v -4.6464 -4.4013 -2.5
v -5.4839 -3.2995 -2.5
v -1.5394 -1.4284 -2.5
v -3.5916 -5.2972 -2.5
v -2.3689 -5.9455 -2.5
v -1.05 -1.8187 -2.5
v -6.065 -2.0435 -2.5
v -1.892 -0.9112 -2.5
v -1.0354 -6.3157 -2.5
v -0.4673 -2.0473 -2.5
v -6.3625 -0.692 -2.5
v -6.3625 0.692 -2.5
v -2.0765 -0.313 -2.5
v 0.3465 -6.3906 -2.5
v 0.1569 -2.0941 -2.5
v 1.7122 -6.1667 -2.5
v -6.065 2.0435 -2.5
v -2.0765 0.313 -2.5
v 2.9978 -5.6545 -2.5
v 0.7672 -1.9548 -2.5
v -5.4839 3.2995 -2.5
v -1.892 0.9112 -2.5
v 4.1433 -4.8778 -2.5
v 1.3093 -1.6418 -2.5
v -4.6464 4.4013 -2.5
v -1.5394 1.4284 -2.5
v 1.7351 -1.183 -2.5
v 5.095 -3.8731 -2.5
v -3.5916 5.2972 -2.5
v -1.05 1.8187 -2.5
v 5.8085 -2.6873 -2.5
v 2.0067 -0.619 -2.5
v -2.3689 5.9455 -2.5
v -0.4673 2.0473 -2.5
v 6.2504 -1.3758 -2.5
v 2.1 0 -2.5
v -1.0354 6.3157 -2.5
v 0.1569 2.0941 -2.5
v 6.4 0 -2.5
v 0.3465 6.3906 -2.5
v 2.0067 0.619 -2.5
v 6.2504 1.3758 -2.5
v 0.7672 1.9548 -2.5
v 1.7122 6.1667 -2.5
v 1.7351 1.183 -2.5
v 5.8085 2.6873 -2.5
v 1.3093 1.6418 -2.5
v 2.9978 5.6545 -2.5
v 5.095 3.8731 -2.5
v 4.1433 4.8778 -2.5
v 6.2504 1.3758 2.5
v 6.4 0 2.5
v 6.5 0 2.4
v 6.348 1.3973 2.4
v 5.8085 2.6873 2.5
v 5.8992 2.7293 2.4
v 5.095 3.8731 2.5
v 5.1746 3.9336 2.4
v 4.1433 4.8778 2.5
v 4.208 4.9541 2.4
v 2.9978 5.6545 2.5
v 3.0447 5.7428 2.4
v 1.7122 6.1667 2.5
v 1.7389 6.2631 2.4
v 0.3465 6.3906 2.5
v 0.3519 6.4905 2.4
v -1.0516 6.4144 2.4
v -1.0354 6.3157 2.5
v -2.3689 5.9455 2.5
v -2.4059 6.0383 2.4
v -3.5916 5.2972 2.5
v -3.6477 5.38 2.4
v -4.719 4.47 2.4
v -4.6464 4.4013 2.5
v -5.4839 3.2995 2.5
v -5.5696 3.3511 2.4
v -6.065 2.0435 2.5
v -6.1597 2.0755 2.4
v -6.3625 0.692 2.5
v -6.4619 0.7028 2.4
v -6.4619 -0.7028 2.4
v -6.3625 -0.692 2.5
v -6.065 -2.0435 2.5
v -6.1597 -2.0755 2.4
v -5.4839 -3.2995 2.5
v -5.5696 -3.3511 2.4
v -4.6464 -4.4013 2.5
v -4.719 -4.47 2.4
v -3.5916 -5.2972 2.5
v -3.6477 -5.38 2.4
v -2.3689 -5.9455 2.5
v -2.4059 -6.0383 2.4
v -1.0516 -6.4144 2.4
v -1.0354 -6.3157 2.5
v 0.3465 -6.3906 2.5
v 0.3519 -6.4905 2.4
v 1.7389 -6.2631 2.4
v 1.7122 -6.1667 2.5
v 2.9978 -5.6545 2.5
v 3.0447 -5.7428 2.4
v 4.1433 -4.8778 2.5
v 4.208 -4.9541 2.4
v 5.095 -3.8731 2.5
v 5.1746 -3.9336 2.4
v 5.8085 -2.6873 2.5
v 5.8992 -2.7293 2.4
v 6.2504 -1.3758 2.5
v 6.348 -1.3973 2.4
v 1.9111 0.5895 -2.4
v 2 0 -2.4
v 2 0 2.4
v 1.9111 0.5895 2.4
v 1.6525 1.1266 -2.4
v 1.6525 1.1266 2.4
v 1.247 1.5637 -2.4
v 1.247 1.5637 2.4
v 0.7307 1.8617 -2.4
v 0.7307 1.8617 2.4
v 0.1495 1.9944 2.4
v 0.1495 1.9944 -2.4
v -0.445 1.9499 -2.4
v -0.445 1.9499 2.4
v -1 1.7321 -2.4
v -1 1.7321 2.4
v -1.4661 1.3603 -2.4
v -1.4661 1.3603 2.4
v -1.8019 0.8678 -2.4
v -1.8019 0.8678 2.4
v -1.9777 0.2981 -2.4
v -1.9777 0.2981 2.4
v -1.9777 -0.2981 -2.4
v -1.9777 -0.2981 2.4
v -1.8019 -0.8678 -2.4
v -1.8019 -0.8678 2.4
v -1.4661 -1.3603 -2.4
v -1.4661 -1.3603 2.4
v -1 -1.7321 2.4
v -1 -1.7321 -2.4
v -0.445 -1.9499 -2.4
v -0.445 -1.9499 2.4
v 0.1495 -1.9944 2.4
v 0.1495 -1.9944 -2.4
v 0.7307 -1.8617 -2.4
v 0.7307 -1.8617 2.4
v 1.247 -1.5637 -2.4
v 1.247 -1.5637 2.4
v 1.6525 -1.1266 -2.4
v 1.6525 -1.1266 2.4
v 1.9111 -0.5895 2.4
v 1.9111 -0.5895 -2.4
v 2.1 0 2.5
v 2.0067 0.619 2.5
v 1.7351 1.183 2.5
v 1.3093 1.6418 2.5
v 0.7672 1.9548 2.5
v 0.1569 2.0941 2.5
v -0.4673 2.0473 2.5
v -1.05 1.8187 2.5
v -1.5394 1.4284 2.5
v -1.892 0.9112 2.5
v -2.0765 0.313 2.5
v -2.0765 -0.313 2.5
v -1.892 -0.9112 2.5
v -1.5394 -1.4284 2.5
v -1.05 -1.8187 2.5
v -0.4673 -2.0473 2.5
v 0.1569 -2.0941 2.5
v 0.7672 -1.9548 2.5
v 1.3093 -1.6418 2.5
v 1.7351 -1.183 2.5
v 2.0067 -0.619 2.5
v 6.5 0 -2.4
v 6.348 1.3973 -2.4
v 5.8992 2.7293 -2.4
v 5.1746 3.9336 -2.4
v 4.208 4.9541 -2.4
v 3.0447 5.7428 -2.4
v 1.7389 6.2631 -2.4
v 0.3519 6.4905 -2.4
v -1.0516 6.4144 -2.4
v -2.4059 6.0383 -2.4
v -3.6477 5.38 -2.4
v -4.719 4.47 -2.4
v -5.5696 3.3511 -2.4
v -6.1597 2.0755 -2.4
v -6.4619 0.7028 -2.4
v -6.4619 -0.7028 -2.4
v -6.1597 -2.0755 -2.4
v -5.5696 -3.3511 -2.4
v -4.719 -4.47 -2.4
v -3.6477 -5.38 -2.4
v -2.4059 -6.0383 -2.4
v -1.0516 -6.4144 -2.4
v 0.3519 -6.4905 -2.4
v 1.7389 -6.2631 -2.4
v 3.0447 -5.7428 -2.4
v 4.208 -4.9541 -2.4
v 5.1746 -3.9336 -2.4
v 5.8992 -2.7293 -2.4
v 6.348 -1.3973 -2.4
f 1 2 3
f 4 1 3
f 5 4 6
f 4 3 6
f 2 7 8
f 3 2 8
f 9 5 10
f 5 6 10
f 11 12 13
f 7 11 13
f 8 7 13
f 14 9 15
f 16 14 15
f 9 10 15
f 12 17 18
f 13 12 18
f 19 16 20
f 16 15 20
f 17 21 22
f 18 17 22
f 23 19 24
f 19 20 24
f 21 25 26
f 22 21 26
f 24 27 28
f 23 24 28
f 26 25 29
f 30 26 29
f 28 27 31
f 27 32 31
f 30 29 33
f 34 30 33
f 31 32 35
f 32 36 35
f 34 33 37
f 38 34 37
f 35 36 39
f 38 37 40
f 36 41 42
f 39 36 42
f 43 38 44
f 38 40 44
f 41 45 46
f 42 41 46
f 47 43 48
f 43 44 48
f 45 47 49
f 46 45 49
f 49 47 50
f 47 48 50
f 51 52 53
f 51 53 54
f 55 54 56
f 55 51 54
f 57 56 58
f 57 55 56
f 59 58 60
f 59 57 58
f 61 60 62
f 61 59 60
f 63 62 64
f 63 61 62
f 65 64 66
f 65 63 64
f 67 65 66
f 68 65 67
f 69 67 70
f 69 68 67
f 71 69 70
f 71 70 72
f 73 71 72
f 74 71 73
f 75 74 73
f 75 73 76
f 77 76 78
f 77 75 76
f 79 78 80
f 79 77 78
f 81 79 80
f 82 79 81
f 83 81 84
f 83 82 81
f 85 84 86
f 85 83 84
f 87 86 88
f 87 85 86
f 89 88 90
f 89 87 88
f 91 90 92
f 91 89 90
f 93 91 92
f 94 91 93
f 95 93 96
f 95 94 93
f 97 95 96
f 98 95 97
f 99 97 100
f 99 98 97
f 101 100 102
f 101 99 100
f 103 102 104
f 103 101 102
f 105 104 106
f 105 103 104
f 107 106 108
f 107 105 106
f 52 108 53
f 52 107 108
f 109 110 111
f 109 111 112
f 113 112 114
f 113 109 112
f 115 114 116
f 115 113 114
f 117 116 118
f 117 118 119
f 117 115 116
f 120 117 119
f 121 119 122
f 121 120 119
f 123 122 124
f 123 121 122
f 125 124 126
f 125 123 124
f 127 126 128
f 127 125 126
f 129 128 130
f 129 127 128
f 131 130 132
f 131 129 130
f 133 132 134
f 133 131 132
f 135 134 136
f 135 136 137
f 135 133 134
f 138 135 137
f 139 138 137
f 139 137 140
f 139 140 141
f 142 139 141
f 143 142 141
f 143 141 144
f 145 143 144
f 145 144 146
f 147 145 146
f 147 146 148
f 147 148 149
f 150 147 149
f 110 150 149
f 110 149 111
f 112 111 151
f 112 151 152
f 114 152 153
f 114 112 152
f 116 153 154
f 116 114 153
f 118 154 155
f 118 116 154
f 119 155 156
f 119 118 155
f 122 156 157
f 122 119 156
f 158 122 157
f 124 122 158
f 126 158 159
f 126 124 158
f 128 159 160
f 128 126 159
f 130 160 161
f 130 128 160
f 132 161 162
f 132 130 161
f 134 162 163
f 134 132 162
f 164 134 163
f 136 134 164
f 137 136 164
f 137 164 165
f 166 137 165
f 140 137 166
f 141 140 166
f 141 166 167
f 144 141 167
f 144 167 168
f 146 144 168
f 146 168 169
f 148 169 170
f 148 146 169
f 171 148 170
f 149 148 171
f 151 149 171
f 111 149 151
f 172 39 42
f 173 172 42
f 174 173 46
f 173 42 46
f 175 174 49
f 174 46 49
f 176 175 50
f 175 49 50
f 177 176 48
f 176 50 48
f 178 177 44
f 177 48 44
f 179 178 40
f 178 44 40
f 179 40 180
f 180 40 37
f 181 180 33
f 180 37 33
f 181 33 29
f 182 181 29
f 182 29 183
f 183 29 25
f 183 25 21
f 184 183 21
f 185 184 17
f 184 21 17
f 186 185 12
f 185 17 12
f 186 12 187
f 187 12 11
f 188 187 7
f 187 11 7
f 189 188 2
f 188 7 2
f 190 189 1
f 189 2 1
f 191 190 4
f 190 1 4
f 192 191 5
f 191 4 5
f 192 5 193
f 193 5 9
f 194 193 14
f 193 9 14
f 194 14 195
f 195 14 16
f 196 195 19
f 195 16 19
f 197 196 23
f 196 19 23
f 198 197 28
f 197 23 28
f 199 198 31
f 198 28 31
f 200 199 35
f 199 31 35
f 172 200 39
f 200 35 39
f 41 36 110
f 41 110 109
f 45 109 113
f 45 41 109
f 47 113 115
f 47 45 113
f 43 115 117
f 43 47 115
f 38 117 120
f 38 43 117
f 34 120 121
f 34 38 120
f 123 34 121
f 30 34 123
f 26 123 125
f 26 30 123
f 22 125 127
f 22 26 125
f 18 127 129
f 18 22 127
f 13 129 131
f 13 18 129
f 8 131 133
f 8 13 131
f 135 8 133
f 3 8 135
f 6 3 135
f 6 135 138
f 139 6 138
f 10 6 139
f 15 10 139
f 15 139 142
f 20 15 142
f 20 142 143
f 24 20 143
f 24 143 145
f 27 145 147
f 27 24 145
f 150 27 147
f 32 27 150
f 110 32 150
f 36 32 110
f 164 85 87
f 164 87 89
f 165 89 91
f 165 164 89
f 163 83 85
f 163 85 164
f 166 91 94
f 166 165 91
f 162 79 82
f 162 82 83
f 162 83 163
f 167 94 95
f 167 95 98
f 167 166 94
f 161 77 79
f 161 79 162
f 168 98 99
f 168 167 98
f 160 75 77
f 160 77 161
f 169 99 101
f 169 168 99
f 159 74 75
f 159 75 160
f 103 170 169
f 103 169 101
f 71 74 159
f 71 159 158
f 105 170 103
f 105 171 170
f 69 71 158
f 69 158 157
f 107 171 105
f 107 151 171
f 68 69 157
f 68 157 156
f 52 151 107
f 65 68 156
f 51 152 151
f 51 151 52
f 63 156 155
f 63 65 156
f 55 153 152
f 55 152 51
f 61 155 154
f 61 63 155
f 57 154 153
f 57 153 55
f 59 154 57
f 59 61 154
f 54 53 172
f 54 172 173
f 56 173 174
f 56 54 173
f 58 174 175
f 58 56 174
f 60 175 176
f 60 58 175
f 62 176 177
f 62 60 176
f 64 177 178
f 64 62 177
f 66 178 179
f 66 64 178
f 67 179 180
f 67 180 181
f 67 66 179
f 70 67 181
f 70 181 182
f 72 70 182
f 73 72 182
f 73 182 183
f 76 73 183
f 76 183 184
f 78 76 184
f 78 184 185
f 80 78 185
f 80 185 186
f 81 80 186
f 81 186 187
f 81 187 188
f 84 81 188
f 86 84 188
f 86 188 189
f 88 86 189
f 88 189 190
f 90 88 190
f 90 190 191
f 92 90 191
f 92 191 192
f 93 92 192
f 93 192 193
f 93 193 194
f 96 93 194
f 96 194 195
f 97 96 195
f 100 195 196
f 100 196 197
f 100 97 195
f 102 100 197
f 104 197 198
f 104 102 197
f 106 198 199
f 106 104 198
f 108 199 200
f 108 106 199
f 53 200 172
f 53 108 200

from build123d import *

# Parameters (mm, degrees)
SKETCH_1_R      = 6.5
SKETCH_1_R_2    = 2
EXTRUDE_1_DEPTH = 2.5
CHAMFER_1_SIZE  = 0.1


with BuildPart() as part:
    # 草图1 → 凸台-拉伸1 (new body, symmetric)
    with BuildSketch(Plane.XY):
        Circle(SKETCH_1_R)
        Circle(SKETCH_1_R_2, mode=Mode.SUBTRACT)
    extrude(amount=EXTRUDE_1_DEPTH, both=True)

    # 倒角1
    chamfer_1_edges = [part.edges().sort_by_distance(p)[0] for p in [
        (-6.5, 0, -2.5),
        (-6.5, 0, 2.5),
        (-2, 0, -2.5),
        (-2, 0, 2.5),
    ]]
    chamfer(chamfer_1_edges, length=CHAMFER_1_SIZE)


solid = part.part
